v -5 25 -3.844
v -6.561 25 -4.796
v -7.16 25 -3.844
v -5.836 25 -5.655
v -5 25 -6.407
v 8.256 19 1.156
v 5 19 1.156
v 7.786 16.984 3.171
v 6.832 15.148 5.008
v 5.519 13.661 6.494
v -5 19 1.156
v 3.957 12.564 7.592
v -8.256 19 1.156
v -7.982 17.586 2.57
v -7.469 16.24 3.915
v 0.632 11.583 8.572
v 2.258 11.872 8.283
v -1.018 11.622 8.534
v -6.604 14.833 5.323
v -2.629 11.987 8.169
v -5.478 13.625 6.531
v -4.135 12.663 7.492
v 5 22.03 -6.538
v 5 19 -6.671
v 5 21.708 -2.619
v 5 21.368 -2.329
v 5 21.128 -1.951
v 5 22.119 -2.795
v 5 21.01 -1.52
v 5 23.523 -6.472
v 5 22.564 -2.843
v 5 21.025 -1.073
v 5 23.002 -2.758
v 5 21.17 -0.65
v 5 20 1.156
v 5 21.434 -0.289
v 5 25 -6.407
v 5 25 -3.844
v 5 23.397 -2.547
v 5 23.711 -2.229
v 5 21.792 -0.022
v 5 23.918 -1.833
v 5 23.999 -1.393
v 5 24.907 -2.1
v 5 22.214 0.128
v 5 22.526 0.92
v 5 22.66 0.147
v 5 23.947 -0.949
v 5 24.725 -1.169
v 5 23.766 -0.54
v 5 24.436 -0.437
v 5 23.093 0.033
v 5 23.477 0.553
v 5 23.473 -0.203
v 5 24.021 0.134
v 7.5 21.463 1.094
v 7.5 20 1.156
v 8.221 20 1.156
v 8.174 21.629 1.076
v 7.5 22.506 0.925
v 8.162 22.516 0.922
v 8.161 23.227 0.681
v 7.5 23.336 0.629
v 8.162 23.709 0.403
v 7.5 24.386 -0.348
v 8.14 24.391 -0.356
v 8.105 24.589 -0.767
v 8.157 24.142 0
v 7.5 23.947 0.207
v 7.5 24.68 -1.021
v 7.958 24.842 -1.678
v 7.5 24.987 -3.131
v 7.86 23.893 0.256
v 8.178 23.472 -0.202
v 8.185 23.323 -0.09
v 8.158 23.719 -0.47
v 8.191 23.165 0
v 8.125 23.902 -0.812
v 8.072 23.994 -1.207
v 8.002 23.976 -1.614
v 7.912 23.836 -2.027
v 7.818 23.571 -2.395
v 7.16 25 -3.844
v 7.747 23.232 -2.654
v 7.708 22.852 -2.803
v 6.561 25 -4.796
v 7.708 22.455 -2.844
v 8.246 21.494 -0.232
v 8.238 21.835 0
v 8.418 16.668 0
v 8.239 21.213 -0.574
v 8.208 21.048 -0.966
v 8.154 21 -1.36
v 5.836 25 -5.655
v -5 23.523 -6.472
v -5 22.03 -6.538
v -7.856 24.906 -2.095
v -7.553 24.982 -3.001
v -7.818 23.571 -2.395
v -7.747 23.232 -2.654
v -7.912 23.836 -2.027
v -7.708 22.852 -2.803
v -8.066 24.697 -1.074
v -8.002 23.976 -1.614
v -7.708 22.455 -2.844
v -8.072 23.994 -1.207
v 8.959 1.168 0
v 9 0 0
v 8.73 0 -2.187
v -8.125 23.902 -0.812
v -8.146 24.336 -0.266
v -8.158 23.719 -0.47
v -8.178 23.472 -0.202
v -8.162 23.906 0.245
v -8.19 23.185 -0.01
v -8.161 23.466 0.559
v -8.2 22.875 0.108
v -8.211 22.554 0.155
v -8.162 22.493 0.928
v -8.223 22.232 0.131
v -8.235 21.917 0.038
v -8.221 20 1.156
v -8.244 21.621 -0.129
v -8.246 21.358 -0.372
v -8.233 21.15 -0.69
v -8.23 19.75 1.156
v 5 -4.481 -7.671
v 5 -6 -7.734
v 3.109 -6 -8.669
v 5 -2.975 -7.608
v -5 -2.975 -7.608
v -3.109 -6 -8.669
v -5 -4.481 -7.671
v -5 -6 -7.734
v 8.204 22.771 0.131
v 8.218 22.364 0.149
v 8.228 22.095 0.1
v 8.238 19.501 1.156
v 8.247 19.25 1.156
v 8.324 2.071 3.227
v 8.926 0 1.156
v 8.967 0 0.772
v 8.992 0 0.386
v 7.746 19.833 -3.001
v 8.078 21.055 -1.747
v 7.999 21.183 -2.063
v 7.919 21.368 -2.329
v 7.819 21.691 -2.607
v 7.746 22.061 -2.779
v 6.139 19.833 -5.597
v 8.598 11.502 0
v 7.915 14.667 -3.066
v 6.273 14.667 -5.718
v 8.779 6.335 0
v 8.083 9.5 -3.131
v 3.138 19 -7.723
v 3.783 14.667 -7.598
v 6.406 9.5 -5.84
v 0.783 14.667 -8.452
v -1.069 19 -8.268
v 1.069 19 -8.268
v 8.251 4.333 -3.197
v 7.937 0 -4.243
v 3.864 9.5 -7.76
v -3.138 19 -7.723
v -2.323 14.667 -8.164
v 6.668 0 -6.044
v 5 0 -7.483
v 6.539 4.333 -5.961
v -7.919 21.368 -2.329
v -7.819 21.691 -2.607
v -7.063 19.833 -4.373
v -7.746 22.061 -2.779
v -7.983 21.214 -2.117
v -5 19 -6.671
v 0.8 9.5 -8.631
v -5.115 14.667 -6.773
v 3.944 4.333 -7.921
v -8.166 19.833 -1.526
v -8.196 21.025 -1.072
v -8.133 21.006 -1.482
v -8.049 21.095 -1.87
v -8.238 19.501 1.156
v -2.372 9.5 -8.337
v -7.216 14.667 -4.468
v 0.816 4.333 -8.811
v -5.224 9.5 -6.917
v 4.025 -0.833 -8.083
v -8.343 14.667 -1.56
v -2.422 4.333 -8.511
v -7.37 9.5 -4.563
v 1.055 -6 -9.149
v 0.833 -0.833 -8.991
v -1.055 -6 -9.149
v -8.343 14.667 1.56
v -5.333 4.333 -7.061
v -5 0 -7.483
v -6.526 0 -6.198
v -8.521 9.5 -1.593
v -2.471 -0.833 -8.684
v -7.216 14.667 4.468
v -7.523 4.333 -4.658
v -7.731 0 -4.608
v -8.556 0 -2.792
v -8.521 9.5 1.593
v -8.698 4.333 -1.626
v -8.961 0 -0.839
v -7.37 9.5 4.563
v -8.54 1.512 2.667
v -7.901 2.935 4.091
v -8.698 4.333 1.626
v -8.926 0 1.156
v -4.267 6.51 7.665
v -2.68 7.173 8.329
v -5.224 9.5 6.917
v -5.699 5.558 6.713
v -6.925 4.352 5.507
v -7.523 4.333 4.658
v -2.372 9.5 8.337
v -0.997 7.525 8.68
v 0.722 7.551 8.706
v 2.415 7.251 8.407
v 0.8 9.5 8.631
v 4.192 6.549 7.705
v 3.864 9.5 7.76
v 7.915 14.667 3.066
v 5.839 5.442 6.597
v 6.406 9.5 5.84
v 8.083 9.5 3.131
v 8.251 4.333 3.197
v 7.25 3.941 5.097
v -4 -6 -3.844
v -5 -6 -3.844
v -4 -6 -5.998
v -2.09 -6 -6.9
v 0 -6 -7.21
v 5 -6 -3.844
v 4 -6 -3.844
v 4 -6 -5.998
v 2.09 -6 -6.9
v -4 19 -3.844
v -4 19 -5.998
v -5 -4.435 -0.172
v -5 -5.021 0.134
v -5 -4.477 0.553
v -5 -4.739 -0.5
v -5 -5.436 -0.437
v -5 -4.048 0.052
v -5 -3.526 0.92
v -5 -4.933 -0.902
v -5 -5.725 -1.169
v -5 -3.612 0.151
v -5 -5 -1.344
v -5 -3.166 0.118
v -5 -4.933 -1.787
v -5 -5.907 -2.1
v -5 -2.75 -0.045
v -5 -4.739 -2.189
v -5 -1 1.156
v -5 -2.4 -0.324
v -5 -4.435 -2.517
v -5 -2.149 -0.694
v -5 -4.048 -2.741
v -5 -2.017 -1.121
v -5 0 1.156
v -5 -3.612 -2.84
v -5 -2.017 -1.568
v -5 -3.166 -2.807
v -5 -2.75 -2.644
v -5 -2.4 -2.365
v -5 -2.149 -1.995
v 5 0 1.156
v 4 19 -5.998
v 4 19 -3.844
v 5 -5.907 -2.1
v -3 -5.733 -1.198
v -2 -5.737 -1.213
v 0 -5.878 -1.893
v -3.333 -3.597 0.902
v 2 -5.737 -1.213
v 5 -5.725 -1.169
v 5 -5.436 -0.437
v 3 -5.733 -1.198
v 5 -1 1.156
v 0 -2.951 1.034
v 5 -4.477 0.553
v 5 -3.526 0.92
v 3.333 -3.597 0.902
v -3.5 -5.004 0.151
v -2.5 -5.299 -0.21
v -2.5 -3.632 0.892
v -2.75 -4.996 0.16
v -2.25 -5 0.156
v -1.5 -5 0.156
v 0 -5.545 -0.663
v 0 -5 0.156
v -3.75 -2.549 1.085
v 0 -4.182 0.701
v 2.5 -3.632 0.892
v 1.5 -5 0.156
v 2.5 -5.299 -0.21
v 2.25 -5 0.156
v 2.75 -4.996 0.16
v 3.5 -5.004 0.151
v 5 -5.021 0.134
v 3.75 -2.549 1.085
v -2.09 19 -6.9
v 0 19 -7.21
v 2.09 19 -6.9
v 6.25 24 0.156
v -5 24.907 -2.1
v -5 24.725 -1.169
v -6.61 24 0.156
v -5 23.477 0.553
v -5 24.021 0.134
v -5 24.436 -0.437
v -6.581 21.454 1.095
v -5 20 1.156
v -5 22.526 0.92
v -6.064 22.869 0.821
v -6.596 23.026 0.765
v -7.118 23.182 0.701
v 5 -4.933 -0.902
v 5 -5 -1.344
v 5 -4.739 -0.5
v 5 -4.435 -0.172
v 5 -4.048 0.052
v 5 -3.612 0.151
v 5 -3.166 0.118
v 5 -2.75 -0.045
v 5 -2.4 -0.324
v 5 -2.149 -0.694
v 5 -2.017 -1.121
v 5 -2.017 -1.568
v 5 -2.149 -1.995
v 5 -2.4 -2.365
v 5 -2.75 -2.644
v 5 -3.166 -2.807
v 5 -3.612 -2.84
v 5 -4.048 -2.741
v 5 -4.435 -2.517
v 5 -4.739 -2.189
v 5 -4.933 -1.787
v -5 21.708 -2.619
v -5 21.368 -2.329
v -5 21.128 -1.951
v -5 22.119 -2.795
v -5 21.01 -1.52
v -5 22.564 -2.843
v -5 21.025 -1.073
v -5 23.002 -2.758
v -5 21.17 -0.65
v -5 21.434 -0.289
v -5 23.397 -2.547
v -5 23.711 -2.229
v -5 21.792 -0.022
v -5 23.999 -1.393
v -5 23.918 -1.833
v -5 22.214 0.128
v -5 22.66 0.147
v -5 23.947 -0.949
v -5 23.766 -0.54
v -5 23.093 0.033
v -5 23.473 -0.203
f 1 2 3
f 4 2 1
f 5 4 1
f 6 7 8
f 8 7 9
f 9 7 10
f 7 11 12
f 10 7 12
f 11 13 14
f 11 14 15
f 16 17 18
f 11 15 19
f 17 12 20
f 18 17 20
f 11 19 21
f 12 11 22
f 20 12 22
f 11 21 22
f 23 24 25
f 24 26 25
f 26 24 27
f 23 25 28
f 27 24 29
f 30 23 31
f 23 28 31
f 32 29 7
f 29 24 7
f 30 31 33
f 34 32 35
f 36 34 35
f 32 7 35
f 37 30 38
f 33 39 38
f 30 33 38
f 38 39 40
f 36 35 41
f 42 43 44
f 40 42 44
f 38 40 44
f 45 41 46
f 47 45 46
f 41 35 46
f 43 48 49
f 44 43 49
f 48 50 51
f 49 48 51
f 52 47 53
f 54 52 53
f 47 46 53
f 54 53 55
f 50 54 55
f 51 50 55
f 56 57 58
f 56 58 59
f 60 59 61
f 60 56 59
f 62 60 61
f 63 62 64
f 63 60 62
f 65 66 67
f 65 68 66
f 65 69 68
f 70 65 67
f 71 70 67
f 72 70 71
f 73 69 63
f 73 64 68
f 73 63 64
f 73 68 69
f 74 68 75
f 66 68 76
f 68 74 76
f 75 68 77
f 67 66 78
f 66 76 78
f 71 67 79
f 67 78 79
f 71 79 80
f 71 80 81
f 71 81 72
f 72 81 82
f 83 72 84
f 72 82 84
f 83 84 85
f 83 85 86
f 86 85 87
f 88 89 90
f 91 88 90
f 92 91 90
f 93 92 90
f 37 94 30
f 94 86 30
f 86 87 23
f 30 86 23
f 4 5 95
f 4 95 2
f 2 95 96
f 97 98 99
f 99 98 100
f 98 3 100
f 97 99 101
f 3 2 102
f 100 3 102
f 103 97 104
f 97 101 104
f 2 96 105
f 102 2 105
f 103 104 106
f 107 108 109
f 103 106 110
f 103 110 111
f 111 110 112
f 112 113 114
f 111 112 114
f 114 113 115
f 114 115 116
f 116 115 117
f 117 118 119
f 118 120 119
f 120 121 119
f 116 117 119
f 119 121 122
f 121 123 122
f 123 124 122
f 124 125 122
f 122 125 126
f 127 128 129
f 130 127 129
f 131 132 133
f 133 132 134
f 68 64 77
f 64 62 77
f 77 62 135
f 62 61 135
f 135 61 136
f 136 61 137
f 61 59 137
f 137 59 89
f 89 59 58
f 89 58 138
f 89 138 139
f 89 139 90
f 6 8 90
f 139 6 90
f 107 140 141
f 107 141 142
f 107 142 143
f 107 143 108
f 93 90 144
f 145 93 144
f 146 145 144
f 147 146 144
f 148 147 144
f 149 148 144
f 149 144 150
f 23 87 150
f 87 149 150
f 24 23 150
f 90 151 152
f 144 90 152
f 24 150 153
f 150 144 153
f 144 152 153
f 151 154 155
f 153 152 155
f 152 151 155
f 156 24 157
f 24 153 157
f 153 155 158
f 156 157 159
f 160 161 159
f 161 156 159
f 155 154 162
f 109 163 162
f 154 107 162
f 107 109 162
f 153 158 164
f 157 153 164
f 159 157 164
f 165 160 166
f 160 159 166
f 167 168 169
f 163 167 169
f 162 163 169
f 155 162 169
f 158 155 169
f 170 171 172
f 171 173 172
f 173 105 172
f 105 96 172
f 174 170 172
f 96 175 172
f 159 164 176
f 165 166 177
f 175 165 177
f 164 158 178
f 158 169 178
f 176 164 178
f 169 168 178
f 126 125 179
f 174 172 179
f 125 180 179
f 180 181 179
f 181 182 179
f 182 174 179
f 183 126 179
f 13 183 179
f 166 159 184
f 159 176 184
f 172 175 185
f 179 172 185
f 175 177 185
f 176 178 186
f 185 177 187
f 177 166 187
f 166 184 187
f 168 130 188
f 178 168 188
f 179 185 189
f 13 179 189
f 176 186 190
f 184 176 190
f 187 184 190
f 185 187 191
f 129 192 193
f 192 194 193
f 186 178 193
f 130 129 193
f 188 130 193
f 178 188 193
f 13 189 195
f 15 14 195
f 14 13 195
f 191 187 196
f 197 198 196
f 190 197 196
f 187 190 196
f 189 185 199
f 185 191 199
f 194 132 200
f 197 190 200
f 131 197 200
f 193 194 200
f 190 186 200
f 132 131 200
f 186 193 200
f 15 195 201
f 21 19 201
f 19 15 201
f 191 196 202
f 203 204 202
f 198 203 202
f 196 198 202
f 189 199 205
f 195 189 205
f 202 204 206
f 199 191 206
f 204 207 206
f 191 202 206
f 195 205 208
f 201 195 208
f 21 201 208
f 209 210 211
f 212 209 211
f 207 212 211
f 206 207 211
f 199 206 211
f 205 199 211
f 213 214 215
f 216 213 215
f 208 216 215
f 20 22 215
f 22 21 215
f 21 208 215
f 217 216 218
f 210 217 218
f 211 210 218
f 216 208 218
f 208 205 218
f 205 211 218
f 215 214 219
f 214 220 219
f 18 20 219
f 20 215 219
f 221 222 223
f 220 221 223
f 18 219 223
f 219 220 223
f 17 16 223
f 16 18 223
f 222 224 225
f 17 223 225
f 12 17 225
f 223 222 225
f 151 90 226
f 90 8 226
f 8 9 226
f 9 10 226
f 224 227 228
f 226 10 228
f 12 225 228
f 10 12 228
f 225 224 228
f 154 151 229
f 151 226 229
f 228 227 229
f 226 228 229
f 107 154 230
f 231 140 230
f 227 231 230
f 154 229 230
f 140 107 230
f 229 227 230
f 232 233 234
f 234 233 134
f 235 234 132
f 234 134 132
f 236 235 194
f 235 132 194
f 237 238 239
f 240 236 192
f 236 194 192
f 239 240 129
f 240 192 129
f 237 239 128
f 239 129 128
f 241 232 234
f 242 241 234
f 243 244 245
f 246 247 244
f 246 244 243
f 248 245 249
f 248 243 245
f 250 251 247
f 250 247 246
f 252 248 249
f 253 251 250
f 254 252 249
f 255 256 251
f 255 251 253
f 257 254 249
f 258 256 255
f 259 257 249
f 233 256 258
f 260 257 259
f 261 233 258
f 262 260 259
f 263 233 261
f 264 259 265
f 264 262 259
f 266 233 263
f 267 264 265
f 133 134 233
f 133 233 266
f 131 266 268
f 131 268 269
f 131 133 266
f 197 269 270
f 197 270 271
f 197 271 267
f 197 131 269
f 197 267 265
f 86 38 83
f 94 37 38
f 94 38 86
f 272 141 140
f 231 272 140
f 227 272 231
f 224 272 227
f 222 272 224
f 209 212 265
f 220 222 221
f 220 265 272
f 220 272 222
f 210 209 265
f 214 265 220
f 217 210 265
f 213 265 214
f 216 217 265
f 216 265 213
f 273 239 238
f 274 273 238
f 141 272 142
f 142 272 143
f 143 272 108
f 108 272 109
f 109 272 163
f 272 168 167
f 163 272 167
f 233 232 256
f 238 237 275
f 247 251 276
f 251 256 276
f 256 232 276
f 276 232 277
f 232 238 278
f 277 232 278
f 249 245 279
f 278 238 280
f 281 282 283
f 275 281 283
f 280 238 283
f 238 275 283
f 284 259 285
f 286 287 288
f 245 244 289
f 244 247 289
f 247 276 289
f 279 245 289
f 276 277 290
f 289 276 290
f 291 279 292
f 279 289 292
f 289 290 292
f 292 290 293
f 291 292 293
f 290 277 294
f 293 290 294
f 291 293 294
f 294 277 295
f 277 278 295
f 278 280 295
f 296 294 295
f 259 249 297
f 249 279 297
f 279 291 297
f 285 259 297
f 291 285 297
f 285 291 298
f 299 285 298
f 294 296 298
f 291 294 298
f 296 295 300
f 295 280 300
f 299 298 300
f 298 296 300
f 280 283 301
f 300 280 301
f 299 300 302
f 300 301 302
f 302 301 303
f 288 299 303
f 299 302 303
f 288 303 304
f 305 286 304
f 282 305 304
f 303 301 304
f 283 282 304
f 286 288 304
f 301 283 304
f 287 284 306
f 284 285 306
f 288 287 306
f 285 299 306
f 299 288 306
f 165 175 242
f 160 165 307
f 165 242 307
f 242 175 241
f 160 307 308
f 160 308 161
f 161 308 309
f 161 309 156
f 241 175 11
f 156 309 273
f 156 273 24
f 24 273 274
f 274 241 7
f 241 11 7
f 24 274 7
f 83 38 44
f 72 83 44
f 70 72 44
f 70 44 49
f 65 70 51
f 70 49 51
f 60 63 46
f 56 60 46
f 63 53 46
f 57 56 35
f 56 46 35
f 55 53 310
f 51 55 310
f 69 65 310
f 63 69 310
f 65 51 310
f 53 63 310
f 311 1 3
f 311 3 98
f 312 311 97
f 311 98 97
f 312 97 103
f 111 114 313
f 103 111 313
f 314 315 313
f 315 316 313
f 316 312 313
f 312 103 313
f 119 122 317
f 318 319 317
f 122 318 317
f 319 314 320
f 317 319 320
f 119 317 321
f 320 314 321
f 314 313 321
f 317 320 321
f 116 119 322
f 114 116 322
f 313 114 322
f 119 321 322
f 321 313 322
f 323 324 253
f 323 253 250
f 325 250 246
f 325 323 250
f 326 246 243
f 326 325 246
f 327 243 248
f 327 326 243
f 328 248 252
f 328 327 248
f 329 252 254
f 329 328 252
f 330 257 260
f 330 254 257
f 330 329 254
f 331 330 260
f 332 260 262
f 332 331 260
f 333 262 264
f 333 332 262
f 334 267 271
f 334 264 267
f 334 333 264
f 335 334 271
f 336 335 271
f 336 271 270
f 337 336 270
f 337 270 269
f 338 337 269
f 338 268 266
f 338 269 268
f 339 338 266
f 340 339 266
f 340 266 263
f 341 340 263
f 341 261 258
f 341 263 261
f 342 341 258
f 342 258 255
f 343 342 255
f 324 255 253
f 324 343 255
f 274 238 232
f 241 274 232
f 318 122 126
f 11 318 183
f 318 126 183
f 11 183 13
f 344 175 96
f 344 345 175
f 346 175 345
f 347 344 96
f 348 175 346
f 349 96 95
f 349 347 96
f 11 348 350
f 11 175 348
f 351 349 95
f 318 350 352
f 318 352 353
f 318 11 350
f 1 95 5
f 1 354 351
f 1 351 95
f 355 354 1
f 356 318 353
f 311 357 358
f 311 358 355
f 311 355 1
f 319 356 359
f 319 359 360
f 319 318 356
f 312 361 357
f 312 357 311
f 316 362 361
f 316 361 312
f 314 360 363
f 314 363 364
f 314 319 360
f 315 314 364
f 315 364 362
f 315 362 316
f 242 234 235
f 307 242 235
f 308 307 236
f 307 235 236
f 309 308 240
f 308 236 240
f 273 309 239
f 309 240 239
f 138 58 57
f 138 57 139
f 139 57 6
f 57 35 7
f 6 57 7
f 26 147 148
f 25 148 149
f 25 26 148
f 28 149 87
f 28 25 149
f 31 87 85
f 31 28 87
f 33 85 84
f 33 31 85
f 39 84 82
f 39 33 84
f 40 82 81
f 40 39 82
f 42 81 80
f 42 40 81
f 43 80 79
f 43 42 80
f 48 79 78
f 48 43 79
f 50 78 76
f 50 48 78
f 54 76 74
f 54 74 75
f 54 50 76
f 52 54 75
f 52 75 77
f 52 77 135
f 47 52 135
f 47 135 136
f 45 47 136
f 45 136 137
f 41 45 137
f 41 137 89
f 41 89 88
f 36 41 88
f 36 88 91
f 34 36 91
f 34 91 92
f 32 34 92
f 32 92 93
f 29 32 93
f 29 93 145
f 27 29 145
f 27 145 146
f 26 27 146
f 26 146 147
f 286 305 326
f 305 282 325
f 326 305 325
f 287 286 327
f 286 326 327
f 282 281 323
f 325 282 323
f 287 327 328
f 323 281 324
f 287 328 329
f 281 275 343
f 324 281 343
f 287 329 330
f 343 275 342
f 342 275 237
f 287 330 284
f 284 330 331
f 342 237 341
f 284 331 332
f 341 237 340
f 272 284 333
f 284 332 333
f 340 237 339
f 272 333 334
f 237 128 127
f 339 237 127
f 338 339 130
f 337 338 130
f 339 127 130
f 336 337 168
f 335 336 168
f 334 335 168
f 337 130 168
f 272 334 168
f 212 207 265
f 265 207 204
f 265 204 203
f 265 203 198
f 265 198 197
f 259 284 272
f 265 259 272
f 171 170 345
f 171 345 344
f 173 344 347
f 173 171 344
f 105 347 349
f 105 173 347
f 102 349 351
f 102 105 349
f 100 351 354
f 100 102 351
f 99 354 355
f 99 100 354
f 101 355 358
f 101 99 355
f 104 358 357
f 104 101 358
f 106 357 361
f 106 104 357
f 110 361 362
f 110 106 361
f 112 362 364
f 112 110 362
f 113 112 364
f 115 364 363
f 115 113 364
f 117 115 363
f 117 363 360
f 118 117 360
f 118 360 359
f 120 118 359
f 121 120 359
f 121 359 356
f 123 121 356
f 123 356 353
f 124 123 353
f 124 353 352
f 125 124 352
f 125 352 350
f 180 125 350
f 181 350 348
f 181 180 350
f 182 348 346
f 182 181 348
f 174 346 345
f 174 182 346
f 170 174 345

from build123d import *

# Parameters (mm, degrees)
SKETCH1_R                     = 9
BOSS_EXTRUDE1_DEPTH           = 25
BOSS_EXTRUDE1_TAPER           = 2
BOSS_EXTRUDE1_OTHER_WAY_DEPTH = 6
BOSS_EXTRUDE1_OTHER_WAY_TAPER = -2
CUT_EXTRUDE1_DEPTH            = 29.189194514
CUT_EXTRUDE1_DEPTH_BACK       = 29.189194514
CUT_EXTRUDE2_START            = -10.365035118
CUT_EXTRUDE2_OUTLINE_W        = 9.770566763
CUT_EXTRUDE2_OUTLINE_H        = 6
CUT_EXTRUDE2_DEPTH            = 10.365035118
CUT_EXTRUDE3_DEPTH            = 31.096766332
CUT_EXTRUDE3_DEPTH_BACK       = 31.096766332
SKETCH5_R                     = 1.5
FILLET1_SIZE                  = 5
CUT_EXTRUDE4_DEPTH            = 29.121439218
CUT_EXTRUDE4_DEPTH_BACK       = 29.121439218
SKETCH8_W                     = 10
SKETCH8_H                     = 6
CUT_EXTRUDE5_DEPTH            = 29.520763505
CUT_EXTRUDE6_DEPTH            = 31.096766332
CUT_EXTRUDE6_DEPTH_BACK       = 31.096766332
SKETCH9_R                     = 1.5
FILLET2_SIZE                  = 5
CUT_EXTRUDE7_DEPTH            = 34.568070447


with BuildPart() as part:
    # Sketch1 → Boss-Extrude1 (new body)
    with BuildSketch(Plane(origin=(0, 0, 0), x_dir=(1, 0, 0), z_dir=(0, 1, 0))):
        Circle(SKETCH1_R)
    extrude(amount=BOSS_EXTRUDE1_DEPTH, taper=BOSS_EXTRUDE1_TAPER)

    # Sketch1 → Boss-Extrude1 other way (add)
    with BuildSketch(Plane(origin=(0, 0, 0), x_dir=(1, 0, 0), z_dir=(0, 1, 0))):
        Circle(SKETCH1_R)
    extrude(amount=-BOSS_EXTRUDE1_OTHER_WAY_DEPTH, taper=BOSS_EXTRUDE1_OTHER_WAY_TAPER)

    # Sketch3 → Cut-Extrude1 (cut, two sides: drawn at the far end of the back side and taken through both)
    with BuildSketch(Plane(origin=(0, 0, 0), x_dir=(0, 0, -1), z_dir=(1, 0, 0)).offset(-CUT_EXTRUDE1_DEPTH_BACK)):
        Polygon((-1.155510401, -6), (-1.155510401, 0), (-11.155510401, 10), (-11.155510401, -6), align=None)
    extrude(amount=CUT_EXTRUDE1_DEPTH + CUT_EXTRUDE1_DEPTH_BACK, mode=Mode.SUBTRACT)

    # Cut-Extrude2: read off the stored shape, not the designer's step
    # Cut-Extrude2 outline → Cut-Extrude2 (cut)
    with BuildSketch(Plane.XY.offset(1.155510401).offset(CUT_EXTRUDE2_START)):
        with Locations((-9.885283382, -3)):
            Rectangle(CUT_EXTRUDE2_OUTLINE_W, CUT_EXTRUDE2_OUTLINE_H)
        with Locations((9.885283382, -3)):
            Rectangle(CUT_EXTRUDE2_OUTLINE_W, CUT_EXTRUDE2_OUTLINE_H)
    extrude(amount=CUT_EXTRUDE2_DEPTH, mode=Mode.SUBTRACT)

    # Sketch5 → Cut-Extrude3 (cut, two sides: drawn at the far end of the back side and taken through both)
    with BuildSketch(Plane.ZY.offset(5).offset(-CUT_EXTRUDE3_DEPTH_BACK)):
        with Locations(Location((-1.344489599, -3.5, 0), (0, 0, 270))):
            Circle(SKETCH5_R)
    extrude(amount=CUT_EXTRUDE3_DEPTH + CUT_EXTRUDE3_DEPTH_BACK, mode=Mode.SUBTRACT)

    # Fillet1
    # a fillet whose section is not a circle: 5 mm, written as the material it takes off along each edge
    with BuildSketch(Plane(origin=(17.5, -6, 1.155510401), x_dir=(0, 0, -1), z_dir=(-1, 0, 0))) as fillet1_piece_1:
        with BuildLine():
            Bezier((FILLET1_SIZE, 0), (0, 0), (0, -FILLET1_SIZE), weights=[1, 1.5, 1])
            Line((0, -FILLET1_SIZE), (0, 0))
            Line((0, 0), (FILLET1_SIZE, 0))
        make_face()
    extrude(amount=35, mode=Mode.SUBTRACT)

    # Sketch7 → Cut-Extrude4 (cut, two sides: drawn at the far end of the back side and taken through both)
    with BuildSketch(Plane(origin=(0, 0, 0), x_dir=(0, 0, -1), z_dir=(1, 0, 0)).offset(-CUT_EXTRUDE4_DEPTH_BACK)):
        Polygon((-1.155510401, 25), (-1.155510401, 19), (-12.24506556, 7.91044484), (-12.24506556, 25), align=None)
    extrude(amount=CUT_EXTRUDE4_DEPTH + CUT_EXTRUDE4_DEPTH_BACK, mode=Mode.SUBTRACT)

    # Sketch8 → Cut-Extrude5 (cut, through all)
    with BuildSketch(Plane.XY.offset(1.155510401)):
        with Locations((0, 22)):
            Rectangle(SKETCH8_W, SKETCH8_H)
    extrude(amount=-CUT_EXTRUDE5_DEPTH, mode=Mode.SUBTRACT)

    # Sketch9 → Cut-Extrude6 (cut, two sides: drawn at the far end of the back side and taken through both)
    with BuildSketch(Plane(origin=(-5, 0, 0), x_dir=(0, 0, -1), z_dir=(1, 0, 0)).offset(-CUT_EXTRUDE6_DEPTH_BACK)):
        with Locations(Location((1.344489599, 22.5, 0), (0, 0, 311.001081294))):
            Circle(SKETCH9_R)
    extrude(amount=CUT_EXTRUDE6_DEPTH + CUT_EXTRUDE6_DEPTH_BACK, mode=Mode.SUBTRACT)

    # Fillet2
    # a fillet whose section is not a circle: 5 mm, written as the material it takes off along each edge
    with BuildSketch(Plane(origin=(-20.544414959, 25, 1.155510401), x_dir=(0, 0, -1), z_dir=(1, 0, 0))) as fillet2_piece_1:
        with BuildLine():
            Bezier((FILLET2_SIZE, 0), (0, 0), (0, -FILLET2_SIZE), weights=[1, 1.5, 1])
            Line((0, -FILLET2_SIZE), (0, 0))
            Line((0, 0), (FILLET2_SIZE, 0))
        make_face()
    extrude(amount=28.044414959, mode=Mode.SUBTRACT)
    with BuildSketch(Plane(origin=(-7.5, 25, 1.155510401), x_dir=(0, -1, 0), z_dir=(1, 0, 0))) as fillet2_piece_2:
        with BuildLine():
            Bezier((FILLET2_SIZE, 0), (0, 0), (0, FILLET2_SIZE), weights=[1, 1.5, 1])
            Line((0, FILLET2_SIZE), (0, 0))
            Line((0, 0), (FILLET2_SIZE, 0))
        make_face()
    extrude(amount=28.044414959, mode=Mode.SUBTRACT)

    # Sketch10 → Cut-Extrude7 (cut, through all)
    with BuildSketch(Plane.XZ.offset(6)):
        with BuildLine():
            Line((-4, -3.844489599), (-4, -5.998103467))
            ThreePointArc((-4, -5.998103467), (0, -7.209524617), (4, -5.998103467))
            Line((4, -5.998103467), (4, -3.844489599))
            Line((4, -3.844489599), (-4, -3.844489599))
        make_face()
    extrude(amount=-CUT_EXTRUDE7_DEPTH, mode=Mode.SUBTRACT)


solid = part.part
